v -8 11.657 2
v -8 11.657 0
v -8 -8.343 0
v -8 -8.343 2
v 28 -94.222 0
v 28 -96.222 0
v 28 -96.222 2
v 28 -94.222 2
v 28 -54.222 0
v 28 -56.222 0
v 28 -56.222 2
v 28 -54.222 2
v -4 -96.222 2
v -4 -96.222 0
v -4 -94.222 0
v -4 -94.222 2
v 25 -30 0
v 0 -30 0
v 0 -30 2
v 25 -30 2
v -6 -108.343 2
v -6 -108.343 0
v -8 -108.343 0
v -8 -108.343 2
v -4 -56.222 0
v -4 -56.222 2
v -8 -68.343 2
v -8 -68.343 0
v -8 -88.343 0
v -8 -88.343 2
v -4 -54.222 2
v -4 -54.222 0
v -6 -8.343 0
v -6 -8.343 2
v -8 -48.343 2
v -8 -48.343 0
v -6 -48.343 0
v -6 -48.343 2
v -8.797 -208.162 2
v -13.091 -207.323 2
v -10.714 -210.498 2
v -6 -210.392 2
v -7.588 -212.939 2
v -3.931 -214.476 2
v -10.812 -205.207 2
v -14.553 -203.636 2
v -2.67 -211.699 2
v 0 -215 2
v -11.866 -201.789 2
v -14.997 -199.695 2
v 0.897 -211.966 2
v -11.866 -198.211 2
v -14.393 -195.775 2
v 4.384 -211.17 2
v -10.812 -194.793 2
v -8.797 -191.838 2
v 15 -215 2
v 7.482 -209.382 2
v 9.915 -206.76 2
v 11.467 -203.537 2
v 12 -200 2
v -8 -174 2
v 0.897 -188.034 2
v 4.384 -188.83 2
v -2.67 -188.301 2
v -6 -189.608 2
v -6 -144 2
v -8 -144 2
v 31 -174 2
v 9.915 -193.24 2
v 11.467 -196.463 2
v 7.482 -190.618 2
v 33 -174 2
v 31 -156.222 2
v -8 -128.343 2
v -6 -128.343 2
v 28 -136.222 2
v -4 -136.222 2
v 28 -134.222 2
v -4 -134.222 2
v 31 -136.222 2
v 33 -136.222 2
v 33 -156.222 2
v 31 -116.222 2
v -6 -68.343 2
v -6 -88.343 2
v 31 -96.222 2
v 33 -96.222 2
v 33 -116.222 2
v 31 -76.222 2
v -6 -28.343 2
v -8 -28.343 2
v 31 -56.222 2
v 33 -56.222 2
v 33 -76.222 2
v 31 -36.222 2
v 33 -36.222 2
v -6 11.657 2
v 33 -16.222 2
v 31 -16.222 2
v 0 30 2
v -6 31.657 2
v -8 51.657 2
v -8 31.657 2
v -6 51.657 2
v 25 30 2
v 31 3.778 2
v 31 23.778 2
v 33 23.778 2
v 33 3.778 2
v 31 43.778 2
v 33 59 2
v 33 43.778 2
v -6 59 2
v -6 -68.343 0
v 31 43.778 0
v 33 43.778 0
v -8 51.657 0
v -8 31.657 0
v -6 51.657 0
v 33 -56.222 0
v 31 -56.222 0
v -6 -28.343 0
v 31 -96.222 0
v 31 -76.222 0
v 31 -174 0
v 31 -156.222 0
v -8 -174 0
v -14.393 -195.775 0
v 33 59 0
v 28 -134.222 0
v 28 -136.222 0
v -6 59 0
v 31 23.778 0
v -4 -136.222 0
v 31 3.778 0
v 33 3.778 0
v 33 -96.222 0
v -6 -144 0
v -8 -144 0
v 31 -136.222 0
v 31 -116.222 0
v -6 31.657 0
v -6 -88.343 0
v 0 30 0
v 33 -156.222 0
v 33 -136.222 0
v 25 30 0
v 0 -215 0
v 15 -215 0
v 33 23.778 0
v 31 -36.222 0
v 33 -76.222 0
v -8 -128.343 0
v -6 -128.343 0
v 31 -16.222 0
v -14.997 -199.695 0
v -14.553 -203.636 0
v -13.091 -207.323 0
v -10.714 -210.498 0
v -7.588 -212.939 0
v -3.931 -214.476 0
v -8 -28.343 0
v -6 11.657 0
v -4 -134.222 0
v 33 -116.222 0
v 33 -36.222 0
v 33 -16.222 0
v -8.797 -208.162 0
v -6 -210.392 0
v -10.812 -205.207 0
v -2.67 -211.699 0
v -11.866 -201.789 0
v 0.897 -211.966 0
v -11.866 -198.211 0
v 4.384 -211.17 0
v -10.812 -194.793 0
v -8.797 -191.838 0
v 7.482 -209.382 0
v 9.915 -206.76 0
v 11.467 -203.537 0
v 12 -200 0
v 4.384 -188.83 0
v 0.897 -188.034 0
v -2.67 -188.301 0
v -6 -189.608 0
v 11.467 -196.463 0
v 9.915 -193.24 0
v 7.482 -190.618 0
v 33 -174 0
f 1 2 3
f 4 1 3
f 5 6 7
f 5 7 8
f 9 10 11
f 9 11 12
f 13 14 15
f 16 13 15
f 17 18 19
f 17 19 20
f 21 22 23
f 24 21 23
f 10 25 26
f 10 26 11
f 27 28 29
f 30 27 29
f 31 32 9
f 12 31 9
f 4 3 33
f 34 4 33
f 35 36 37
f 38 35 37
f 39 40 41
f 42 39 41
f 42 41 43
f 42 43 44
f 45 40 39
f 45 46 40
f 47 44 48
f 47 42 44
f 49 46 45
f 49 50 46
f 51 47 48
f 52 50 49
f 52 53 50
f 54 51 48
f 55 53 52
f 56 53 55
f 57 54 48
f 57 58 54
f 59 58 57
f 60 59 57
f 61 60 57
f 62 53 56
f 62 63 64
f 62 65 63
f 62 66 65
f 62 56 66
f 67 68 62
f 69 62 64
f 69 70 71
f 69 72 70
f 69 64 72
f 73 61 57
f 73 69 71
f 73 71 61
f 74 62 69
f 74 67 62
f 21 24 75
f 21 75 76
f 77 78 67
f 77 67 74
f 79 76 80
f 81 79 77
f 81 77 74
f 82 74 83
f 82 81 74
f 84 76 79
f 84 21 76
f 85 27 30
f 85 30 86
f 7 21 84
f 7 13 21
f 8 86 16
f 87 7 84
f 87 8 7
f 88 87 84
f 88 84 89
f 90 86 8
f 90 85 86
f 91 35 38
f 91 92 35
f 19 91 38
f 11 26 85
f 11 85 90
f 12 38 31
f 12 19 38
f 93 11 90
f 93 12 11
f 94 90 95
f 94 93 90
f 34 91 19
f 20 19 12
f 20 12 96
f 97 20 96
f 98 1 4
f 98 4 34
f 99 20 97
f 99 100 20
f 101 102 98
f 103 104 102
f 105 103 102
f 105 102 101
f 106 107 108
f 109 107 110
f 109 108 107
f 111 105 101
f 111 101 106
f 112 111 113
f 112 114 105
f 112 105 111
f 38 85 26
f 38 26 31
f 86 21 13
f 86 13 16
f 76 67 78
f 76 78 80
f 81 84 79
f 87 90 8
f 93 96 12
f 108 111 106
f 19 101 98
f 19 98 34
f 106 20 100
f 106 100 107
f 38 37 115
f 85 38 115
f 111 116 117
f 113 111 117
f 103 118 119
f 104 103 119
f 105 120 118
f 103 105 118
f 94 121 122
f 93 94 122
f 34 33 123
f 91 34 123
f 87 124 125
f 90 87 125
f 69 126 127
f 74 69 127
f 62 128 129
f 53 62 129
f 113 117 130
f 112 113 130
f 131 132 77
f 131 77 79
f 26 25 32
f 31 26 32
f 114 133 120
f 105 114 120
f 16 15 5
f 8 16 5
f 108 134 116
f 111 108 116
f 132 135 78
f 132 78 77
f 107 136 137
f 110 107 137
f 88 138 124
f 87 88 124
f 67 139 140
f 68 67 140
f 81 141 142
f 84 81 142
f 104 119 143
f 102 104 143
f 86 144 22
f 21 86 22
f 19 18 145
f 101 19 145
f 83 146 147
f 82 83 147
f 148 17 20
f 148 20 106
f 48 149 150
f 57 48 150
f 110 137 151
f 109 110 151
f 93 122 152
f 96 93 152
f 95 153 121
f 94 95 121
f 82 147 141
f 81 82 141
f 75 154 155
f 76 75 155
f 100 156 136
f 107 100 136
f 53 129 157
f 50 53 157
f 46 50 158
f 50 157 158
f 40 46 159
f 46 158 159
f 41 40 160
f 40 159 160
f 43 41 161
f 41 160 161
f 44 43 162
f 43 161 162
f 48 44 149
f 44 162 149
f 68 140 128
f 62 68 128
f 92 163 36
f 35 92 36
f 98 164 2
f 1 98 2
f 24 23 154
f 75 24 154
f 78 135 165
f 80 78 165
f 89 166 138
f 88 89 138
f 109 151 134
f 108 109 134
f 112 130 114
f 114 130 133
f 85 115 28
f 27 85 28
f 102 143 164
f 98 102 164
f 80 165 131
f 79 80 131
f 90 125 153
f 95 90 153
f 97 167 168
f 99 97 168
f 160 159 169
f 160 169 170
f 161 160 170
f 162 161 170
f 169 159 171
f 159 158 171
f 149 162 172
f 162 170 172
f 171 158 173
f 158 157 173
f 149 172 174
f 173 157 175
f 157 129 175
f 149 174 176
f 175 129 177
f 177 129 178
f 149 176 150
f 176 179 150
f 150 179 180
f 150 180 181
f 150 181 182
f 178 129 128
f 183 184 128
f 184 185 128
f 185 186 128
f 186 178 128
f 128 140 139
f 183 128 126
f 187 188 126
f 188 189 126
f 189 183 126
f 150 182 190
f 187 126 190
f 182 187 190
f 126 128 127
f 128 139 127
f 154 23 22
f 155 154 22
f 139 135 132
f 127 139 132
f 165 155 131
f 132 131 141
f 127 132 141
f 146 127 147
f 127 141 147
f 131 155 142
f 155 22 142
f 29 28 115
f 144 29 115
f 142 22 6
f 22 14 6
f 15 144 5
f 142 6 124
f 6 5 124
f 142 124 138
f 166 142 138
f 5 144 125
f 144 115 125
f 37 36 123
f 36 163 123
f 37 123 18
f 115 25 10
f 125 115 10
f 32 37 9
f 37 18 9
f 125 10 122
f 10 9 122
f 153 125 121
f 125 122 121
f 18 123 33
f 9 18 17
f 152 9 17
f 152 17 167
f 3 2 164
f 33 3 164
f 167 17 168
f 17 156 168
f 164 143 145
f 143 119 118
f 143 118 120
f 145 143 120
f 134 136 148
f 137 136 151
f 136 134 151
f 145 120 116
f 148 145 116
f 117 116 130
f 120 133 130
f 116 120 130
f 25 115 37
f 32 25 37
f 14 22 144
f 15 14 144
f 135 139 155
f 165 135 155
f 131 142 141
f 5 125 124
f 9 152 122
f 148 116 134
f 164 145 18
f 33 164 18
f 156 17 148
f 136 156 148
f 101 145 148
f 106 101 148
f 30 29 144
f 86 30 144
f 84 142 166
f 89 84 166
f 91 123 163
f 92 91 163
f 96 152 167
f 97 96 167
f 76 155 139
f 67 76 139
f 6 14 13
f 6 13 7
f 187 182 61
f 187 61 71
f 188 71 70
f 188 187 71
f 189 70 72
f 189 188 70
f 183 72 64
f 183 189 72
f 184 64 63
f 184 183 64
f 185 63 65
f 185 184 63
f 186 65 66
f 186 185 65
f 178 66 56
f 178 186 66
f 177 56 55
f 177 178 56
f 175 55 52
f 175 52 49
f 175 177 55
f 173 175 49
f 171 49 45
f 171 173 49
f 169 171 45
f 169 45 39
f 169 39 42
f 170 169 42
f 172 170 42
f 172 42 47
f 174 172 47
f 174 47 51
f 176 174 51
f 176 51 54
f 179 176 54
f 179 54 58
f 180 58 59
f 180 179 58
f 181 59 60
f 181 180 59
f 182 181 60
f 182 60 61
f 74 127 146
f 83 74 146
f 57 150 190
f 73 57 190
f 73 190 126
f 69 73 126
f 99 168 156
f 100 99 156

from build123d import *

# Parameters (mm, degrees)
SKETCH_1_R      = 12
SKETCH_1_W      = 32
SKETCH_1_H      = 2
SKETCH_1_W_2    = 25
SKETCH_1_H_2    = 60
EXTRUDE_1_DEPTH = 2


with BuildPart() as part:
    # 草图1 → 凸台-拉伸1 (new body)
    with BuildSketch(Plane.XY):
        with BuildLine():
            Line((-8, -48.342527861), (-6, -48.342527861))
            Line((-6, -48.342527861), (-6, -68.342527861))
            Line((-6, -68.342527861), (-8, -68.342527861))
            Line((-8, -68.342527861), (-8, -88.342527861))
            Line((-8, -88.342527861), (-6, -88.342527861))
            Line((-6, -88.342527861), (-6, -108.342527861))
            Line((-6, -108.342527861), (-8, -108.342527861))
            Line((-8, -108.342527861), (-8, -128.342527861))
            Line((-8, -128.342527861), (-6, -128.342527861))
            Line((-6, -128.342527861), (-6, -144.000000011))
            Line((-6, -144.000000011), (-8, -144.000000011))
            Line((-8, -144.000000011), (-8, -174))
            Line((-8, -174), (-14.392579, -195.774639692))
            ThreePointArc((-14.392579, -195.774639692), (-12.007922481, -208.989426995), (0, -215))
            Line((0, -215), (15, -215))
            Line((15, -215), (33, -174))
            Line((33, -174), (31, -174))
            Line((31, -174), (31, -156.221540553))
            Line((31, -156.221540553), (33, -156.221540553))
            Line((33, -156.221540553), (33, -136.221540553))
            Line((33, -136.221540553), (31, -136.221540553))
            Line((31, -136.221540553), (31, -116.221540553))
            Line((31, -116.221540553), (33, -116.221540553))
            Line((33, -116.221540553), (33, -96.221540553))
            Line((33, -96.221540553), (31, -96.221540553))
            Line((31, -96.221540553), (31, -76.221540553))
            Line((31, -76.221540553), (33, -76.221540553))
            Line((33, -76.221540553), (33, -56.221540553))
            Line((33, -56.221540553), (31, -56.221540553))
            Line((31, -56.221540553), (31, -36.221540553))
            Line((31, -36.221540553), (33, -36.221540553))
            Line((33, -36.221540553), (33, -16.221540553))
            Line((33, -16.221540553), (31, -16.221540553))
            Line((31, -16.221540553), (31, 3.778459447))
            Line((31, 3.778459447), (33, 3.778459447))
            Line((33, 3.778459447), (33, 23.778459447))
            Line((33, 23.778459447), (31, 23.778459447))
            Line((31, 23.778459447), (31, 43.778459447))
            Line((31, 43.778459447), (33, 43.778459447))
            Line((33, 43.778459447), (33, 49))
            Line((33, 49), (33, 59))
            Line((33, 59), (-6, 59))
            Line((-6, 59), (-6, 51.657472139))
            Line((-6, 51.657472139), (-8, 51.657472139))
            Line((-8, 51.657472139), (-8, 31.657472139))
            Line((-8, 31.657472139), (-6, 31.657472139))
            Line((-6, 31.657472139), (-6, 11.657472139))
            Line((-6, 11.657472139), (-8, 11.657472139))
            Line((-8, 11.657472139), (-8, -8.342527861))
            Line((-8, -8.342527861), (-6, -8.342527861))
            Line((-6, -8.342527861), (-6, -28.342527861))
            Line((-6, -28.342527861), (-8, -28.342527861))
            Line((-8, -28.342527861), (-8, -48.342527861))
        make_face()
        with Locations((0, -200)):
            Circle(SKETCH_1_R, mode=Mode.SUBTRACT)
        with Locations((12, -55.221540553)):
            Rectangle(SKETCH_1_W, SKETCH_1_H, mode=Mode.SUBTRACT)
        with Locations((12, -95.221540553)):
            Rectangle(SKETCH_1_W, SKETCH_1_H, mode=Mode.SUBTRACT)
        with Locations((12, -135.221540553)):
            Rectangle(SKETCH_1_W, SKETCH_1_H, mode=Mode.SUBTRACT)
        with Locations((12.5, 0)):
            Rectangle(SKETCH_1_W_2, SKETCH_1_H_2, mode=Mode.SUBTRACT)
    extrude(amount=EXTRUDE_1_DEPTH)


solid = part.part
